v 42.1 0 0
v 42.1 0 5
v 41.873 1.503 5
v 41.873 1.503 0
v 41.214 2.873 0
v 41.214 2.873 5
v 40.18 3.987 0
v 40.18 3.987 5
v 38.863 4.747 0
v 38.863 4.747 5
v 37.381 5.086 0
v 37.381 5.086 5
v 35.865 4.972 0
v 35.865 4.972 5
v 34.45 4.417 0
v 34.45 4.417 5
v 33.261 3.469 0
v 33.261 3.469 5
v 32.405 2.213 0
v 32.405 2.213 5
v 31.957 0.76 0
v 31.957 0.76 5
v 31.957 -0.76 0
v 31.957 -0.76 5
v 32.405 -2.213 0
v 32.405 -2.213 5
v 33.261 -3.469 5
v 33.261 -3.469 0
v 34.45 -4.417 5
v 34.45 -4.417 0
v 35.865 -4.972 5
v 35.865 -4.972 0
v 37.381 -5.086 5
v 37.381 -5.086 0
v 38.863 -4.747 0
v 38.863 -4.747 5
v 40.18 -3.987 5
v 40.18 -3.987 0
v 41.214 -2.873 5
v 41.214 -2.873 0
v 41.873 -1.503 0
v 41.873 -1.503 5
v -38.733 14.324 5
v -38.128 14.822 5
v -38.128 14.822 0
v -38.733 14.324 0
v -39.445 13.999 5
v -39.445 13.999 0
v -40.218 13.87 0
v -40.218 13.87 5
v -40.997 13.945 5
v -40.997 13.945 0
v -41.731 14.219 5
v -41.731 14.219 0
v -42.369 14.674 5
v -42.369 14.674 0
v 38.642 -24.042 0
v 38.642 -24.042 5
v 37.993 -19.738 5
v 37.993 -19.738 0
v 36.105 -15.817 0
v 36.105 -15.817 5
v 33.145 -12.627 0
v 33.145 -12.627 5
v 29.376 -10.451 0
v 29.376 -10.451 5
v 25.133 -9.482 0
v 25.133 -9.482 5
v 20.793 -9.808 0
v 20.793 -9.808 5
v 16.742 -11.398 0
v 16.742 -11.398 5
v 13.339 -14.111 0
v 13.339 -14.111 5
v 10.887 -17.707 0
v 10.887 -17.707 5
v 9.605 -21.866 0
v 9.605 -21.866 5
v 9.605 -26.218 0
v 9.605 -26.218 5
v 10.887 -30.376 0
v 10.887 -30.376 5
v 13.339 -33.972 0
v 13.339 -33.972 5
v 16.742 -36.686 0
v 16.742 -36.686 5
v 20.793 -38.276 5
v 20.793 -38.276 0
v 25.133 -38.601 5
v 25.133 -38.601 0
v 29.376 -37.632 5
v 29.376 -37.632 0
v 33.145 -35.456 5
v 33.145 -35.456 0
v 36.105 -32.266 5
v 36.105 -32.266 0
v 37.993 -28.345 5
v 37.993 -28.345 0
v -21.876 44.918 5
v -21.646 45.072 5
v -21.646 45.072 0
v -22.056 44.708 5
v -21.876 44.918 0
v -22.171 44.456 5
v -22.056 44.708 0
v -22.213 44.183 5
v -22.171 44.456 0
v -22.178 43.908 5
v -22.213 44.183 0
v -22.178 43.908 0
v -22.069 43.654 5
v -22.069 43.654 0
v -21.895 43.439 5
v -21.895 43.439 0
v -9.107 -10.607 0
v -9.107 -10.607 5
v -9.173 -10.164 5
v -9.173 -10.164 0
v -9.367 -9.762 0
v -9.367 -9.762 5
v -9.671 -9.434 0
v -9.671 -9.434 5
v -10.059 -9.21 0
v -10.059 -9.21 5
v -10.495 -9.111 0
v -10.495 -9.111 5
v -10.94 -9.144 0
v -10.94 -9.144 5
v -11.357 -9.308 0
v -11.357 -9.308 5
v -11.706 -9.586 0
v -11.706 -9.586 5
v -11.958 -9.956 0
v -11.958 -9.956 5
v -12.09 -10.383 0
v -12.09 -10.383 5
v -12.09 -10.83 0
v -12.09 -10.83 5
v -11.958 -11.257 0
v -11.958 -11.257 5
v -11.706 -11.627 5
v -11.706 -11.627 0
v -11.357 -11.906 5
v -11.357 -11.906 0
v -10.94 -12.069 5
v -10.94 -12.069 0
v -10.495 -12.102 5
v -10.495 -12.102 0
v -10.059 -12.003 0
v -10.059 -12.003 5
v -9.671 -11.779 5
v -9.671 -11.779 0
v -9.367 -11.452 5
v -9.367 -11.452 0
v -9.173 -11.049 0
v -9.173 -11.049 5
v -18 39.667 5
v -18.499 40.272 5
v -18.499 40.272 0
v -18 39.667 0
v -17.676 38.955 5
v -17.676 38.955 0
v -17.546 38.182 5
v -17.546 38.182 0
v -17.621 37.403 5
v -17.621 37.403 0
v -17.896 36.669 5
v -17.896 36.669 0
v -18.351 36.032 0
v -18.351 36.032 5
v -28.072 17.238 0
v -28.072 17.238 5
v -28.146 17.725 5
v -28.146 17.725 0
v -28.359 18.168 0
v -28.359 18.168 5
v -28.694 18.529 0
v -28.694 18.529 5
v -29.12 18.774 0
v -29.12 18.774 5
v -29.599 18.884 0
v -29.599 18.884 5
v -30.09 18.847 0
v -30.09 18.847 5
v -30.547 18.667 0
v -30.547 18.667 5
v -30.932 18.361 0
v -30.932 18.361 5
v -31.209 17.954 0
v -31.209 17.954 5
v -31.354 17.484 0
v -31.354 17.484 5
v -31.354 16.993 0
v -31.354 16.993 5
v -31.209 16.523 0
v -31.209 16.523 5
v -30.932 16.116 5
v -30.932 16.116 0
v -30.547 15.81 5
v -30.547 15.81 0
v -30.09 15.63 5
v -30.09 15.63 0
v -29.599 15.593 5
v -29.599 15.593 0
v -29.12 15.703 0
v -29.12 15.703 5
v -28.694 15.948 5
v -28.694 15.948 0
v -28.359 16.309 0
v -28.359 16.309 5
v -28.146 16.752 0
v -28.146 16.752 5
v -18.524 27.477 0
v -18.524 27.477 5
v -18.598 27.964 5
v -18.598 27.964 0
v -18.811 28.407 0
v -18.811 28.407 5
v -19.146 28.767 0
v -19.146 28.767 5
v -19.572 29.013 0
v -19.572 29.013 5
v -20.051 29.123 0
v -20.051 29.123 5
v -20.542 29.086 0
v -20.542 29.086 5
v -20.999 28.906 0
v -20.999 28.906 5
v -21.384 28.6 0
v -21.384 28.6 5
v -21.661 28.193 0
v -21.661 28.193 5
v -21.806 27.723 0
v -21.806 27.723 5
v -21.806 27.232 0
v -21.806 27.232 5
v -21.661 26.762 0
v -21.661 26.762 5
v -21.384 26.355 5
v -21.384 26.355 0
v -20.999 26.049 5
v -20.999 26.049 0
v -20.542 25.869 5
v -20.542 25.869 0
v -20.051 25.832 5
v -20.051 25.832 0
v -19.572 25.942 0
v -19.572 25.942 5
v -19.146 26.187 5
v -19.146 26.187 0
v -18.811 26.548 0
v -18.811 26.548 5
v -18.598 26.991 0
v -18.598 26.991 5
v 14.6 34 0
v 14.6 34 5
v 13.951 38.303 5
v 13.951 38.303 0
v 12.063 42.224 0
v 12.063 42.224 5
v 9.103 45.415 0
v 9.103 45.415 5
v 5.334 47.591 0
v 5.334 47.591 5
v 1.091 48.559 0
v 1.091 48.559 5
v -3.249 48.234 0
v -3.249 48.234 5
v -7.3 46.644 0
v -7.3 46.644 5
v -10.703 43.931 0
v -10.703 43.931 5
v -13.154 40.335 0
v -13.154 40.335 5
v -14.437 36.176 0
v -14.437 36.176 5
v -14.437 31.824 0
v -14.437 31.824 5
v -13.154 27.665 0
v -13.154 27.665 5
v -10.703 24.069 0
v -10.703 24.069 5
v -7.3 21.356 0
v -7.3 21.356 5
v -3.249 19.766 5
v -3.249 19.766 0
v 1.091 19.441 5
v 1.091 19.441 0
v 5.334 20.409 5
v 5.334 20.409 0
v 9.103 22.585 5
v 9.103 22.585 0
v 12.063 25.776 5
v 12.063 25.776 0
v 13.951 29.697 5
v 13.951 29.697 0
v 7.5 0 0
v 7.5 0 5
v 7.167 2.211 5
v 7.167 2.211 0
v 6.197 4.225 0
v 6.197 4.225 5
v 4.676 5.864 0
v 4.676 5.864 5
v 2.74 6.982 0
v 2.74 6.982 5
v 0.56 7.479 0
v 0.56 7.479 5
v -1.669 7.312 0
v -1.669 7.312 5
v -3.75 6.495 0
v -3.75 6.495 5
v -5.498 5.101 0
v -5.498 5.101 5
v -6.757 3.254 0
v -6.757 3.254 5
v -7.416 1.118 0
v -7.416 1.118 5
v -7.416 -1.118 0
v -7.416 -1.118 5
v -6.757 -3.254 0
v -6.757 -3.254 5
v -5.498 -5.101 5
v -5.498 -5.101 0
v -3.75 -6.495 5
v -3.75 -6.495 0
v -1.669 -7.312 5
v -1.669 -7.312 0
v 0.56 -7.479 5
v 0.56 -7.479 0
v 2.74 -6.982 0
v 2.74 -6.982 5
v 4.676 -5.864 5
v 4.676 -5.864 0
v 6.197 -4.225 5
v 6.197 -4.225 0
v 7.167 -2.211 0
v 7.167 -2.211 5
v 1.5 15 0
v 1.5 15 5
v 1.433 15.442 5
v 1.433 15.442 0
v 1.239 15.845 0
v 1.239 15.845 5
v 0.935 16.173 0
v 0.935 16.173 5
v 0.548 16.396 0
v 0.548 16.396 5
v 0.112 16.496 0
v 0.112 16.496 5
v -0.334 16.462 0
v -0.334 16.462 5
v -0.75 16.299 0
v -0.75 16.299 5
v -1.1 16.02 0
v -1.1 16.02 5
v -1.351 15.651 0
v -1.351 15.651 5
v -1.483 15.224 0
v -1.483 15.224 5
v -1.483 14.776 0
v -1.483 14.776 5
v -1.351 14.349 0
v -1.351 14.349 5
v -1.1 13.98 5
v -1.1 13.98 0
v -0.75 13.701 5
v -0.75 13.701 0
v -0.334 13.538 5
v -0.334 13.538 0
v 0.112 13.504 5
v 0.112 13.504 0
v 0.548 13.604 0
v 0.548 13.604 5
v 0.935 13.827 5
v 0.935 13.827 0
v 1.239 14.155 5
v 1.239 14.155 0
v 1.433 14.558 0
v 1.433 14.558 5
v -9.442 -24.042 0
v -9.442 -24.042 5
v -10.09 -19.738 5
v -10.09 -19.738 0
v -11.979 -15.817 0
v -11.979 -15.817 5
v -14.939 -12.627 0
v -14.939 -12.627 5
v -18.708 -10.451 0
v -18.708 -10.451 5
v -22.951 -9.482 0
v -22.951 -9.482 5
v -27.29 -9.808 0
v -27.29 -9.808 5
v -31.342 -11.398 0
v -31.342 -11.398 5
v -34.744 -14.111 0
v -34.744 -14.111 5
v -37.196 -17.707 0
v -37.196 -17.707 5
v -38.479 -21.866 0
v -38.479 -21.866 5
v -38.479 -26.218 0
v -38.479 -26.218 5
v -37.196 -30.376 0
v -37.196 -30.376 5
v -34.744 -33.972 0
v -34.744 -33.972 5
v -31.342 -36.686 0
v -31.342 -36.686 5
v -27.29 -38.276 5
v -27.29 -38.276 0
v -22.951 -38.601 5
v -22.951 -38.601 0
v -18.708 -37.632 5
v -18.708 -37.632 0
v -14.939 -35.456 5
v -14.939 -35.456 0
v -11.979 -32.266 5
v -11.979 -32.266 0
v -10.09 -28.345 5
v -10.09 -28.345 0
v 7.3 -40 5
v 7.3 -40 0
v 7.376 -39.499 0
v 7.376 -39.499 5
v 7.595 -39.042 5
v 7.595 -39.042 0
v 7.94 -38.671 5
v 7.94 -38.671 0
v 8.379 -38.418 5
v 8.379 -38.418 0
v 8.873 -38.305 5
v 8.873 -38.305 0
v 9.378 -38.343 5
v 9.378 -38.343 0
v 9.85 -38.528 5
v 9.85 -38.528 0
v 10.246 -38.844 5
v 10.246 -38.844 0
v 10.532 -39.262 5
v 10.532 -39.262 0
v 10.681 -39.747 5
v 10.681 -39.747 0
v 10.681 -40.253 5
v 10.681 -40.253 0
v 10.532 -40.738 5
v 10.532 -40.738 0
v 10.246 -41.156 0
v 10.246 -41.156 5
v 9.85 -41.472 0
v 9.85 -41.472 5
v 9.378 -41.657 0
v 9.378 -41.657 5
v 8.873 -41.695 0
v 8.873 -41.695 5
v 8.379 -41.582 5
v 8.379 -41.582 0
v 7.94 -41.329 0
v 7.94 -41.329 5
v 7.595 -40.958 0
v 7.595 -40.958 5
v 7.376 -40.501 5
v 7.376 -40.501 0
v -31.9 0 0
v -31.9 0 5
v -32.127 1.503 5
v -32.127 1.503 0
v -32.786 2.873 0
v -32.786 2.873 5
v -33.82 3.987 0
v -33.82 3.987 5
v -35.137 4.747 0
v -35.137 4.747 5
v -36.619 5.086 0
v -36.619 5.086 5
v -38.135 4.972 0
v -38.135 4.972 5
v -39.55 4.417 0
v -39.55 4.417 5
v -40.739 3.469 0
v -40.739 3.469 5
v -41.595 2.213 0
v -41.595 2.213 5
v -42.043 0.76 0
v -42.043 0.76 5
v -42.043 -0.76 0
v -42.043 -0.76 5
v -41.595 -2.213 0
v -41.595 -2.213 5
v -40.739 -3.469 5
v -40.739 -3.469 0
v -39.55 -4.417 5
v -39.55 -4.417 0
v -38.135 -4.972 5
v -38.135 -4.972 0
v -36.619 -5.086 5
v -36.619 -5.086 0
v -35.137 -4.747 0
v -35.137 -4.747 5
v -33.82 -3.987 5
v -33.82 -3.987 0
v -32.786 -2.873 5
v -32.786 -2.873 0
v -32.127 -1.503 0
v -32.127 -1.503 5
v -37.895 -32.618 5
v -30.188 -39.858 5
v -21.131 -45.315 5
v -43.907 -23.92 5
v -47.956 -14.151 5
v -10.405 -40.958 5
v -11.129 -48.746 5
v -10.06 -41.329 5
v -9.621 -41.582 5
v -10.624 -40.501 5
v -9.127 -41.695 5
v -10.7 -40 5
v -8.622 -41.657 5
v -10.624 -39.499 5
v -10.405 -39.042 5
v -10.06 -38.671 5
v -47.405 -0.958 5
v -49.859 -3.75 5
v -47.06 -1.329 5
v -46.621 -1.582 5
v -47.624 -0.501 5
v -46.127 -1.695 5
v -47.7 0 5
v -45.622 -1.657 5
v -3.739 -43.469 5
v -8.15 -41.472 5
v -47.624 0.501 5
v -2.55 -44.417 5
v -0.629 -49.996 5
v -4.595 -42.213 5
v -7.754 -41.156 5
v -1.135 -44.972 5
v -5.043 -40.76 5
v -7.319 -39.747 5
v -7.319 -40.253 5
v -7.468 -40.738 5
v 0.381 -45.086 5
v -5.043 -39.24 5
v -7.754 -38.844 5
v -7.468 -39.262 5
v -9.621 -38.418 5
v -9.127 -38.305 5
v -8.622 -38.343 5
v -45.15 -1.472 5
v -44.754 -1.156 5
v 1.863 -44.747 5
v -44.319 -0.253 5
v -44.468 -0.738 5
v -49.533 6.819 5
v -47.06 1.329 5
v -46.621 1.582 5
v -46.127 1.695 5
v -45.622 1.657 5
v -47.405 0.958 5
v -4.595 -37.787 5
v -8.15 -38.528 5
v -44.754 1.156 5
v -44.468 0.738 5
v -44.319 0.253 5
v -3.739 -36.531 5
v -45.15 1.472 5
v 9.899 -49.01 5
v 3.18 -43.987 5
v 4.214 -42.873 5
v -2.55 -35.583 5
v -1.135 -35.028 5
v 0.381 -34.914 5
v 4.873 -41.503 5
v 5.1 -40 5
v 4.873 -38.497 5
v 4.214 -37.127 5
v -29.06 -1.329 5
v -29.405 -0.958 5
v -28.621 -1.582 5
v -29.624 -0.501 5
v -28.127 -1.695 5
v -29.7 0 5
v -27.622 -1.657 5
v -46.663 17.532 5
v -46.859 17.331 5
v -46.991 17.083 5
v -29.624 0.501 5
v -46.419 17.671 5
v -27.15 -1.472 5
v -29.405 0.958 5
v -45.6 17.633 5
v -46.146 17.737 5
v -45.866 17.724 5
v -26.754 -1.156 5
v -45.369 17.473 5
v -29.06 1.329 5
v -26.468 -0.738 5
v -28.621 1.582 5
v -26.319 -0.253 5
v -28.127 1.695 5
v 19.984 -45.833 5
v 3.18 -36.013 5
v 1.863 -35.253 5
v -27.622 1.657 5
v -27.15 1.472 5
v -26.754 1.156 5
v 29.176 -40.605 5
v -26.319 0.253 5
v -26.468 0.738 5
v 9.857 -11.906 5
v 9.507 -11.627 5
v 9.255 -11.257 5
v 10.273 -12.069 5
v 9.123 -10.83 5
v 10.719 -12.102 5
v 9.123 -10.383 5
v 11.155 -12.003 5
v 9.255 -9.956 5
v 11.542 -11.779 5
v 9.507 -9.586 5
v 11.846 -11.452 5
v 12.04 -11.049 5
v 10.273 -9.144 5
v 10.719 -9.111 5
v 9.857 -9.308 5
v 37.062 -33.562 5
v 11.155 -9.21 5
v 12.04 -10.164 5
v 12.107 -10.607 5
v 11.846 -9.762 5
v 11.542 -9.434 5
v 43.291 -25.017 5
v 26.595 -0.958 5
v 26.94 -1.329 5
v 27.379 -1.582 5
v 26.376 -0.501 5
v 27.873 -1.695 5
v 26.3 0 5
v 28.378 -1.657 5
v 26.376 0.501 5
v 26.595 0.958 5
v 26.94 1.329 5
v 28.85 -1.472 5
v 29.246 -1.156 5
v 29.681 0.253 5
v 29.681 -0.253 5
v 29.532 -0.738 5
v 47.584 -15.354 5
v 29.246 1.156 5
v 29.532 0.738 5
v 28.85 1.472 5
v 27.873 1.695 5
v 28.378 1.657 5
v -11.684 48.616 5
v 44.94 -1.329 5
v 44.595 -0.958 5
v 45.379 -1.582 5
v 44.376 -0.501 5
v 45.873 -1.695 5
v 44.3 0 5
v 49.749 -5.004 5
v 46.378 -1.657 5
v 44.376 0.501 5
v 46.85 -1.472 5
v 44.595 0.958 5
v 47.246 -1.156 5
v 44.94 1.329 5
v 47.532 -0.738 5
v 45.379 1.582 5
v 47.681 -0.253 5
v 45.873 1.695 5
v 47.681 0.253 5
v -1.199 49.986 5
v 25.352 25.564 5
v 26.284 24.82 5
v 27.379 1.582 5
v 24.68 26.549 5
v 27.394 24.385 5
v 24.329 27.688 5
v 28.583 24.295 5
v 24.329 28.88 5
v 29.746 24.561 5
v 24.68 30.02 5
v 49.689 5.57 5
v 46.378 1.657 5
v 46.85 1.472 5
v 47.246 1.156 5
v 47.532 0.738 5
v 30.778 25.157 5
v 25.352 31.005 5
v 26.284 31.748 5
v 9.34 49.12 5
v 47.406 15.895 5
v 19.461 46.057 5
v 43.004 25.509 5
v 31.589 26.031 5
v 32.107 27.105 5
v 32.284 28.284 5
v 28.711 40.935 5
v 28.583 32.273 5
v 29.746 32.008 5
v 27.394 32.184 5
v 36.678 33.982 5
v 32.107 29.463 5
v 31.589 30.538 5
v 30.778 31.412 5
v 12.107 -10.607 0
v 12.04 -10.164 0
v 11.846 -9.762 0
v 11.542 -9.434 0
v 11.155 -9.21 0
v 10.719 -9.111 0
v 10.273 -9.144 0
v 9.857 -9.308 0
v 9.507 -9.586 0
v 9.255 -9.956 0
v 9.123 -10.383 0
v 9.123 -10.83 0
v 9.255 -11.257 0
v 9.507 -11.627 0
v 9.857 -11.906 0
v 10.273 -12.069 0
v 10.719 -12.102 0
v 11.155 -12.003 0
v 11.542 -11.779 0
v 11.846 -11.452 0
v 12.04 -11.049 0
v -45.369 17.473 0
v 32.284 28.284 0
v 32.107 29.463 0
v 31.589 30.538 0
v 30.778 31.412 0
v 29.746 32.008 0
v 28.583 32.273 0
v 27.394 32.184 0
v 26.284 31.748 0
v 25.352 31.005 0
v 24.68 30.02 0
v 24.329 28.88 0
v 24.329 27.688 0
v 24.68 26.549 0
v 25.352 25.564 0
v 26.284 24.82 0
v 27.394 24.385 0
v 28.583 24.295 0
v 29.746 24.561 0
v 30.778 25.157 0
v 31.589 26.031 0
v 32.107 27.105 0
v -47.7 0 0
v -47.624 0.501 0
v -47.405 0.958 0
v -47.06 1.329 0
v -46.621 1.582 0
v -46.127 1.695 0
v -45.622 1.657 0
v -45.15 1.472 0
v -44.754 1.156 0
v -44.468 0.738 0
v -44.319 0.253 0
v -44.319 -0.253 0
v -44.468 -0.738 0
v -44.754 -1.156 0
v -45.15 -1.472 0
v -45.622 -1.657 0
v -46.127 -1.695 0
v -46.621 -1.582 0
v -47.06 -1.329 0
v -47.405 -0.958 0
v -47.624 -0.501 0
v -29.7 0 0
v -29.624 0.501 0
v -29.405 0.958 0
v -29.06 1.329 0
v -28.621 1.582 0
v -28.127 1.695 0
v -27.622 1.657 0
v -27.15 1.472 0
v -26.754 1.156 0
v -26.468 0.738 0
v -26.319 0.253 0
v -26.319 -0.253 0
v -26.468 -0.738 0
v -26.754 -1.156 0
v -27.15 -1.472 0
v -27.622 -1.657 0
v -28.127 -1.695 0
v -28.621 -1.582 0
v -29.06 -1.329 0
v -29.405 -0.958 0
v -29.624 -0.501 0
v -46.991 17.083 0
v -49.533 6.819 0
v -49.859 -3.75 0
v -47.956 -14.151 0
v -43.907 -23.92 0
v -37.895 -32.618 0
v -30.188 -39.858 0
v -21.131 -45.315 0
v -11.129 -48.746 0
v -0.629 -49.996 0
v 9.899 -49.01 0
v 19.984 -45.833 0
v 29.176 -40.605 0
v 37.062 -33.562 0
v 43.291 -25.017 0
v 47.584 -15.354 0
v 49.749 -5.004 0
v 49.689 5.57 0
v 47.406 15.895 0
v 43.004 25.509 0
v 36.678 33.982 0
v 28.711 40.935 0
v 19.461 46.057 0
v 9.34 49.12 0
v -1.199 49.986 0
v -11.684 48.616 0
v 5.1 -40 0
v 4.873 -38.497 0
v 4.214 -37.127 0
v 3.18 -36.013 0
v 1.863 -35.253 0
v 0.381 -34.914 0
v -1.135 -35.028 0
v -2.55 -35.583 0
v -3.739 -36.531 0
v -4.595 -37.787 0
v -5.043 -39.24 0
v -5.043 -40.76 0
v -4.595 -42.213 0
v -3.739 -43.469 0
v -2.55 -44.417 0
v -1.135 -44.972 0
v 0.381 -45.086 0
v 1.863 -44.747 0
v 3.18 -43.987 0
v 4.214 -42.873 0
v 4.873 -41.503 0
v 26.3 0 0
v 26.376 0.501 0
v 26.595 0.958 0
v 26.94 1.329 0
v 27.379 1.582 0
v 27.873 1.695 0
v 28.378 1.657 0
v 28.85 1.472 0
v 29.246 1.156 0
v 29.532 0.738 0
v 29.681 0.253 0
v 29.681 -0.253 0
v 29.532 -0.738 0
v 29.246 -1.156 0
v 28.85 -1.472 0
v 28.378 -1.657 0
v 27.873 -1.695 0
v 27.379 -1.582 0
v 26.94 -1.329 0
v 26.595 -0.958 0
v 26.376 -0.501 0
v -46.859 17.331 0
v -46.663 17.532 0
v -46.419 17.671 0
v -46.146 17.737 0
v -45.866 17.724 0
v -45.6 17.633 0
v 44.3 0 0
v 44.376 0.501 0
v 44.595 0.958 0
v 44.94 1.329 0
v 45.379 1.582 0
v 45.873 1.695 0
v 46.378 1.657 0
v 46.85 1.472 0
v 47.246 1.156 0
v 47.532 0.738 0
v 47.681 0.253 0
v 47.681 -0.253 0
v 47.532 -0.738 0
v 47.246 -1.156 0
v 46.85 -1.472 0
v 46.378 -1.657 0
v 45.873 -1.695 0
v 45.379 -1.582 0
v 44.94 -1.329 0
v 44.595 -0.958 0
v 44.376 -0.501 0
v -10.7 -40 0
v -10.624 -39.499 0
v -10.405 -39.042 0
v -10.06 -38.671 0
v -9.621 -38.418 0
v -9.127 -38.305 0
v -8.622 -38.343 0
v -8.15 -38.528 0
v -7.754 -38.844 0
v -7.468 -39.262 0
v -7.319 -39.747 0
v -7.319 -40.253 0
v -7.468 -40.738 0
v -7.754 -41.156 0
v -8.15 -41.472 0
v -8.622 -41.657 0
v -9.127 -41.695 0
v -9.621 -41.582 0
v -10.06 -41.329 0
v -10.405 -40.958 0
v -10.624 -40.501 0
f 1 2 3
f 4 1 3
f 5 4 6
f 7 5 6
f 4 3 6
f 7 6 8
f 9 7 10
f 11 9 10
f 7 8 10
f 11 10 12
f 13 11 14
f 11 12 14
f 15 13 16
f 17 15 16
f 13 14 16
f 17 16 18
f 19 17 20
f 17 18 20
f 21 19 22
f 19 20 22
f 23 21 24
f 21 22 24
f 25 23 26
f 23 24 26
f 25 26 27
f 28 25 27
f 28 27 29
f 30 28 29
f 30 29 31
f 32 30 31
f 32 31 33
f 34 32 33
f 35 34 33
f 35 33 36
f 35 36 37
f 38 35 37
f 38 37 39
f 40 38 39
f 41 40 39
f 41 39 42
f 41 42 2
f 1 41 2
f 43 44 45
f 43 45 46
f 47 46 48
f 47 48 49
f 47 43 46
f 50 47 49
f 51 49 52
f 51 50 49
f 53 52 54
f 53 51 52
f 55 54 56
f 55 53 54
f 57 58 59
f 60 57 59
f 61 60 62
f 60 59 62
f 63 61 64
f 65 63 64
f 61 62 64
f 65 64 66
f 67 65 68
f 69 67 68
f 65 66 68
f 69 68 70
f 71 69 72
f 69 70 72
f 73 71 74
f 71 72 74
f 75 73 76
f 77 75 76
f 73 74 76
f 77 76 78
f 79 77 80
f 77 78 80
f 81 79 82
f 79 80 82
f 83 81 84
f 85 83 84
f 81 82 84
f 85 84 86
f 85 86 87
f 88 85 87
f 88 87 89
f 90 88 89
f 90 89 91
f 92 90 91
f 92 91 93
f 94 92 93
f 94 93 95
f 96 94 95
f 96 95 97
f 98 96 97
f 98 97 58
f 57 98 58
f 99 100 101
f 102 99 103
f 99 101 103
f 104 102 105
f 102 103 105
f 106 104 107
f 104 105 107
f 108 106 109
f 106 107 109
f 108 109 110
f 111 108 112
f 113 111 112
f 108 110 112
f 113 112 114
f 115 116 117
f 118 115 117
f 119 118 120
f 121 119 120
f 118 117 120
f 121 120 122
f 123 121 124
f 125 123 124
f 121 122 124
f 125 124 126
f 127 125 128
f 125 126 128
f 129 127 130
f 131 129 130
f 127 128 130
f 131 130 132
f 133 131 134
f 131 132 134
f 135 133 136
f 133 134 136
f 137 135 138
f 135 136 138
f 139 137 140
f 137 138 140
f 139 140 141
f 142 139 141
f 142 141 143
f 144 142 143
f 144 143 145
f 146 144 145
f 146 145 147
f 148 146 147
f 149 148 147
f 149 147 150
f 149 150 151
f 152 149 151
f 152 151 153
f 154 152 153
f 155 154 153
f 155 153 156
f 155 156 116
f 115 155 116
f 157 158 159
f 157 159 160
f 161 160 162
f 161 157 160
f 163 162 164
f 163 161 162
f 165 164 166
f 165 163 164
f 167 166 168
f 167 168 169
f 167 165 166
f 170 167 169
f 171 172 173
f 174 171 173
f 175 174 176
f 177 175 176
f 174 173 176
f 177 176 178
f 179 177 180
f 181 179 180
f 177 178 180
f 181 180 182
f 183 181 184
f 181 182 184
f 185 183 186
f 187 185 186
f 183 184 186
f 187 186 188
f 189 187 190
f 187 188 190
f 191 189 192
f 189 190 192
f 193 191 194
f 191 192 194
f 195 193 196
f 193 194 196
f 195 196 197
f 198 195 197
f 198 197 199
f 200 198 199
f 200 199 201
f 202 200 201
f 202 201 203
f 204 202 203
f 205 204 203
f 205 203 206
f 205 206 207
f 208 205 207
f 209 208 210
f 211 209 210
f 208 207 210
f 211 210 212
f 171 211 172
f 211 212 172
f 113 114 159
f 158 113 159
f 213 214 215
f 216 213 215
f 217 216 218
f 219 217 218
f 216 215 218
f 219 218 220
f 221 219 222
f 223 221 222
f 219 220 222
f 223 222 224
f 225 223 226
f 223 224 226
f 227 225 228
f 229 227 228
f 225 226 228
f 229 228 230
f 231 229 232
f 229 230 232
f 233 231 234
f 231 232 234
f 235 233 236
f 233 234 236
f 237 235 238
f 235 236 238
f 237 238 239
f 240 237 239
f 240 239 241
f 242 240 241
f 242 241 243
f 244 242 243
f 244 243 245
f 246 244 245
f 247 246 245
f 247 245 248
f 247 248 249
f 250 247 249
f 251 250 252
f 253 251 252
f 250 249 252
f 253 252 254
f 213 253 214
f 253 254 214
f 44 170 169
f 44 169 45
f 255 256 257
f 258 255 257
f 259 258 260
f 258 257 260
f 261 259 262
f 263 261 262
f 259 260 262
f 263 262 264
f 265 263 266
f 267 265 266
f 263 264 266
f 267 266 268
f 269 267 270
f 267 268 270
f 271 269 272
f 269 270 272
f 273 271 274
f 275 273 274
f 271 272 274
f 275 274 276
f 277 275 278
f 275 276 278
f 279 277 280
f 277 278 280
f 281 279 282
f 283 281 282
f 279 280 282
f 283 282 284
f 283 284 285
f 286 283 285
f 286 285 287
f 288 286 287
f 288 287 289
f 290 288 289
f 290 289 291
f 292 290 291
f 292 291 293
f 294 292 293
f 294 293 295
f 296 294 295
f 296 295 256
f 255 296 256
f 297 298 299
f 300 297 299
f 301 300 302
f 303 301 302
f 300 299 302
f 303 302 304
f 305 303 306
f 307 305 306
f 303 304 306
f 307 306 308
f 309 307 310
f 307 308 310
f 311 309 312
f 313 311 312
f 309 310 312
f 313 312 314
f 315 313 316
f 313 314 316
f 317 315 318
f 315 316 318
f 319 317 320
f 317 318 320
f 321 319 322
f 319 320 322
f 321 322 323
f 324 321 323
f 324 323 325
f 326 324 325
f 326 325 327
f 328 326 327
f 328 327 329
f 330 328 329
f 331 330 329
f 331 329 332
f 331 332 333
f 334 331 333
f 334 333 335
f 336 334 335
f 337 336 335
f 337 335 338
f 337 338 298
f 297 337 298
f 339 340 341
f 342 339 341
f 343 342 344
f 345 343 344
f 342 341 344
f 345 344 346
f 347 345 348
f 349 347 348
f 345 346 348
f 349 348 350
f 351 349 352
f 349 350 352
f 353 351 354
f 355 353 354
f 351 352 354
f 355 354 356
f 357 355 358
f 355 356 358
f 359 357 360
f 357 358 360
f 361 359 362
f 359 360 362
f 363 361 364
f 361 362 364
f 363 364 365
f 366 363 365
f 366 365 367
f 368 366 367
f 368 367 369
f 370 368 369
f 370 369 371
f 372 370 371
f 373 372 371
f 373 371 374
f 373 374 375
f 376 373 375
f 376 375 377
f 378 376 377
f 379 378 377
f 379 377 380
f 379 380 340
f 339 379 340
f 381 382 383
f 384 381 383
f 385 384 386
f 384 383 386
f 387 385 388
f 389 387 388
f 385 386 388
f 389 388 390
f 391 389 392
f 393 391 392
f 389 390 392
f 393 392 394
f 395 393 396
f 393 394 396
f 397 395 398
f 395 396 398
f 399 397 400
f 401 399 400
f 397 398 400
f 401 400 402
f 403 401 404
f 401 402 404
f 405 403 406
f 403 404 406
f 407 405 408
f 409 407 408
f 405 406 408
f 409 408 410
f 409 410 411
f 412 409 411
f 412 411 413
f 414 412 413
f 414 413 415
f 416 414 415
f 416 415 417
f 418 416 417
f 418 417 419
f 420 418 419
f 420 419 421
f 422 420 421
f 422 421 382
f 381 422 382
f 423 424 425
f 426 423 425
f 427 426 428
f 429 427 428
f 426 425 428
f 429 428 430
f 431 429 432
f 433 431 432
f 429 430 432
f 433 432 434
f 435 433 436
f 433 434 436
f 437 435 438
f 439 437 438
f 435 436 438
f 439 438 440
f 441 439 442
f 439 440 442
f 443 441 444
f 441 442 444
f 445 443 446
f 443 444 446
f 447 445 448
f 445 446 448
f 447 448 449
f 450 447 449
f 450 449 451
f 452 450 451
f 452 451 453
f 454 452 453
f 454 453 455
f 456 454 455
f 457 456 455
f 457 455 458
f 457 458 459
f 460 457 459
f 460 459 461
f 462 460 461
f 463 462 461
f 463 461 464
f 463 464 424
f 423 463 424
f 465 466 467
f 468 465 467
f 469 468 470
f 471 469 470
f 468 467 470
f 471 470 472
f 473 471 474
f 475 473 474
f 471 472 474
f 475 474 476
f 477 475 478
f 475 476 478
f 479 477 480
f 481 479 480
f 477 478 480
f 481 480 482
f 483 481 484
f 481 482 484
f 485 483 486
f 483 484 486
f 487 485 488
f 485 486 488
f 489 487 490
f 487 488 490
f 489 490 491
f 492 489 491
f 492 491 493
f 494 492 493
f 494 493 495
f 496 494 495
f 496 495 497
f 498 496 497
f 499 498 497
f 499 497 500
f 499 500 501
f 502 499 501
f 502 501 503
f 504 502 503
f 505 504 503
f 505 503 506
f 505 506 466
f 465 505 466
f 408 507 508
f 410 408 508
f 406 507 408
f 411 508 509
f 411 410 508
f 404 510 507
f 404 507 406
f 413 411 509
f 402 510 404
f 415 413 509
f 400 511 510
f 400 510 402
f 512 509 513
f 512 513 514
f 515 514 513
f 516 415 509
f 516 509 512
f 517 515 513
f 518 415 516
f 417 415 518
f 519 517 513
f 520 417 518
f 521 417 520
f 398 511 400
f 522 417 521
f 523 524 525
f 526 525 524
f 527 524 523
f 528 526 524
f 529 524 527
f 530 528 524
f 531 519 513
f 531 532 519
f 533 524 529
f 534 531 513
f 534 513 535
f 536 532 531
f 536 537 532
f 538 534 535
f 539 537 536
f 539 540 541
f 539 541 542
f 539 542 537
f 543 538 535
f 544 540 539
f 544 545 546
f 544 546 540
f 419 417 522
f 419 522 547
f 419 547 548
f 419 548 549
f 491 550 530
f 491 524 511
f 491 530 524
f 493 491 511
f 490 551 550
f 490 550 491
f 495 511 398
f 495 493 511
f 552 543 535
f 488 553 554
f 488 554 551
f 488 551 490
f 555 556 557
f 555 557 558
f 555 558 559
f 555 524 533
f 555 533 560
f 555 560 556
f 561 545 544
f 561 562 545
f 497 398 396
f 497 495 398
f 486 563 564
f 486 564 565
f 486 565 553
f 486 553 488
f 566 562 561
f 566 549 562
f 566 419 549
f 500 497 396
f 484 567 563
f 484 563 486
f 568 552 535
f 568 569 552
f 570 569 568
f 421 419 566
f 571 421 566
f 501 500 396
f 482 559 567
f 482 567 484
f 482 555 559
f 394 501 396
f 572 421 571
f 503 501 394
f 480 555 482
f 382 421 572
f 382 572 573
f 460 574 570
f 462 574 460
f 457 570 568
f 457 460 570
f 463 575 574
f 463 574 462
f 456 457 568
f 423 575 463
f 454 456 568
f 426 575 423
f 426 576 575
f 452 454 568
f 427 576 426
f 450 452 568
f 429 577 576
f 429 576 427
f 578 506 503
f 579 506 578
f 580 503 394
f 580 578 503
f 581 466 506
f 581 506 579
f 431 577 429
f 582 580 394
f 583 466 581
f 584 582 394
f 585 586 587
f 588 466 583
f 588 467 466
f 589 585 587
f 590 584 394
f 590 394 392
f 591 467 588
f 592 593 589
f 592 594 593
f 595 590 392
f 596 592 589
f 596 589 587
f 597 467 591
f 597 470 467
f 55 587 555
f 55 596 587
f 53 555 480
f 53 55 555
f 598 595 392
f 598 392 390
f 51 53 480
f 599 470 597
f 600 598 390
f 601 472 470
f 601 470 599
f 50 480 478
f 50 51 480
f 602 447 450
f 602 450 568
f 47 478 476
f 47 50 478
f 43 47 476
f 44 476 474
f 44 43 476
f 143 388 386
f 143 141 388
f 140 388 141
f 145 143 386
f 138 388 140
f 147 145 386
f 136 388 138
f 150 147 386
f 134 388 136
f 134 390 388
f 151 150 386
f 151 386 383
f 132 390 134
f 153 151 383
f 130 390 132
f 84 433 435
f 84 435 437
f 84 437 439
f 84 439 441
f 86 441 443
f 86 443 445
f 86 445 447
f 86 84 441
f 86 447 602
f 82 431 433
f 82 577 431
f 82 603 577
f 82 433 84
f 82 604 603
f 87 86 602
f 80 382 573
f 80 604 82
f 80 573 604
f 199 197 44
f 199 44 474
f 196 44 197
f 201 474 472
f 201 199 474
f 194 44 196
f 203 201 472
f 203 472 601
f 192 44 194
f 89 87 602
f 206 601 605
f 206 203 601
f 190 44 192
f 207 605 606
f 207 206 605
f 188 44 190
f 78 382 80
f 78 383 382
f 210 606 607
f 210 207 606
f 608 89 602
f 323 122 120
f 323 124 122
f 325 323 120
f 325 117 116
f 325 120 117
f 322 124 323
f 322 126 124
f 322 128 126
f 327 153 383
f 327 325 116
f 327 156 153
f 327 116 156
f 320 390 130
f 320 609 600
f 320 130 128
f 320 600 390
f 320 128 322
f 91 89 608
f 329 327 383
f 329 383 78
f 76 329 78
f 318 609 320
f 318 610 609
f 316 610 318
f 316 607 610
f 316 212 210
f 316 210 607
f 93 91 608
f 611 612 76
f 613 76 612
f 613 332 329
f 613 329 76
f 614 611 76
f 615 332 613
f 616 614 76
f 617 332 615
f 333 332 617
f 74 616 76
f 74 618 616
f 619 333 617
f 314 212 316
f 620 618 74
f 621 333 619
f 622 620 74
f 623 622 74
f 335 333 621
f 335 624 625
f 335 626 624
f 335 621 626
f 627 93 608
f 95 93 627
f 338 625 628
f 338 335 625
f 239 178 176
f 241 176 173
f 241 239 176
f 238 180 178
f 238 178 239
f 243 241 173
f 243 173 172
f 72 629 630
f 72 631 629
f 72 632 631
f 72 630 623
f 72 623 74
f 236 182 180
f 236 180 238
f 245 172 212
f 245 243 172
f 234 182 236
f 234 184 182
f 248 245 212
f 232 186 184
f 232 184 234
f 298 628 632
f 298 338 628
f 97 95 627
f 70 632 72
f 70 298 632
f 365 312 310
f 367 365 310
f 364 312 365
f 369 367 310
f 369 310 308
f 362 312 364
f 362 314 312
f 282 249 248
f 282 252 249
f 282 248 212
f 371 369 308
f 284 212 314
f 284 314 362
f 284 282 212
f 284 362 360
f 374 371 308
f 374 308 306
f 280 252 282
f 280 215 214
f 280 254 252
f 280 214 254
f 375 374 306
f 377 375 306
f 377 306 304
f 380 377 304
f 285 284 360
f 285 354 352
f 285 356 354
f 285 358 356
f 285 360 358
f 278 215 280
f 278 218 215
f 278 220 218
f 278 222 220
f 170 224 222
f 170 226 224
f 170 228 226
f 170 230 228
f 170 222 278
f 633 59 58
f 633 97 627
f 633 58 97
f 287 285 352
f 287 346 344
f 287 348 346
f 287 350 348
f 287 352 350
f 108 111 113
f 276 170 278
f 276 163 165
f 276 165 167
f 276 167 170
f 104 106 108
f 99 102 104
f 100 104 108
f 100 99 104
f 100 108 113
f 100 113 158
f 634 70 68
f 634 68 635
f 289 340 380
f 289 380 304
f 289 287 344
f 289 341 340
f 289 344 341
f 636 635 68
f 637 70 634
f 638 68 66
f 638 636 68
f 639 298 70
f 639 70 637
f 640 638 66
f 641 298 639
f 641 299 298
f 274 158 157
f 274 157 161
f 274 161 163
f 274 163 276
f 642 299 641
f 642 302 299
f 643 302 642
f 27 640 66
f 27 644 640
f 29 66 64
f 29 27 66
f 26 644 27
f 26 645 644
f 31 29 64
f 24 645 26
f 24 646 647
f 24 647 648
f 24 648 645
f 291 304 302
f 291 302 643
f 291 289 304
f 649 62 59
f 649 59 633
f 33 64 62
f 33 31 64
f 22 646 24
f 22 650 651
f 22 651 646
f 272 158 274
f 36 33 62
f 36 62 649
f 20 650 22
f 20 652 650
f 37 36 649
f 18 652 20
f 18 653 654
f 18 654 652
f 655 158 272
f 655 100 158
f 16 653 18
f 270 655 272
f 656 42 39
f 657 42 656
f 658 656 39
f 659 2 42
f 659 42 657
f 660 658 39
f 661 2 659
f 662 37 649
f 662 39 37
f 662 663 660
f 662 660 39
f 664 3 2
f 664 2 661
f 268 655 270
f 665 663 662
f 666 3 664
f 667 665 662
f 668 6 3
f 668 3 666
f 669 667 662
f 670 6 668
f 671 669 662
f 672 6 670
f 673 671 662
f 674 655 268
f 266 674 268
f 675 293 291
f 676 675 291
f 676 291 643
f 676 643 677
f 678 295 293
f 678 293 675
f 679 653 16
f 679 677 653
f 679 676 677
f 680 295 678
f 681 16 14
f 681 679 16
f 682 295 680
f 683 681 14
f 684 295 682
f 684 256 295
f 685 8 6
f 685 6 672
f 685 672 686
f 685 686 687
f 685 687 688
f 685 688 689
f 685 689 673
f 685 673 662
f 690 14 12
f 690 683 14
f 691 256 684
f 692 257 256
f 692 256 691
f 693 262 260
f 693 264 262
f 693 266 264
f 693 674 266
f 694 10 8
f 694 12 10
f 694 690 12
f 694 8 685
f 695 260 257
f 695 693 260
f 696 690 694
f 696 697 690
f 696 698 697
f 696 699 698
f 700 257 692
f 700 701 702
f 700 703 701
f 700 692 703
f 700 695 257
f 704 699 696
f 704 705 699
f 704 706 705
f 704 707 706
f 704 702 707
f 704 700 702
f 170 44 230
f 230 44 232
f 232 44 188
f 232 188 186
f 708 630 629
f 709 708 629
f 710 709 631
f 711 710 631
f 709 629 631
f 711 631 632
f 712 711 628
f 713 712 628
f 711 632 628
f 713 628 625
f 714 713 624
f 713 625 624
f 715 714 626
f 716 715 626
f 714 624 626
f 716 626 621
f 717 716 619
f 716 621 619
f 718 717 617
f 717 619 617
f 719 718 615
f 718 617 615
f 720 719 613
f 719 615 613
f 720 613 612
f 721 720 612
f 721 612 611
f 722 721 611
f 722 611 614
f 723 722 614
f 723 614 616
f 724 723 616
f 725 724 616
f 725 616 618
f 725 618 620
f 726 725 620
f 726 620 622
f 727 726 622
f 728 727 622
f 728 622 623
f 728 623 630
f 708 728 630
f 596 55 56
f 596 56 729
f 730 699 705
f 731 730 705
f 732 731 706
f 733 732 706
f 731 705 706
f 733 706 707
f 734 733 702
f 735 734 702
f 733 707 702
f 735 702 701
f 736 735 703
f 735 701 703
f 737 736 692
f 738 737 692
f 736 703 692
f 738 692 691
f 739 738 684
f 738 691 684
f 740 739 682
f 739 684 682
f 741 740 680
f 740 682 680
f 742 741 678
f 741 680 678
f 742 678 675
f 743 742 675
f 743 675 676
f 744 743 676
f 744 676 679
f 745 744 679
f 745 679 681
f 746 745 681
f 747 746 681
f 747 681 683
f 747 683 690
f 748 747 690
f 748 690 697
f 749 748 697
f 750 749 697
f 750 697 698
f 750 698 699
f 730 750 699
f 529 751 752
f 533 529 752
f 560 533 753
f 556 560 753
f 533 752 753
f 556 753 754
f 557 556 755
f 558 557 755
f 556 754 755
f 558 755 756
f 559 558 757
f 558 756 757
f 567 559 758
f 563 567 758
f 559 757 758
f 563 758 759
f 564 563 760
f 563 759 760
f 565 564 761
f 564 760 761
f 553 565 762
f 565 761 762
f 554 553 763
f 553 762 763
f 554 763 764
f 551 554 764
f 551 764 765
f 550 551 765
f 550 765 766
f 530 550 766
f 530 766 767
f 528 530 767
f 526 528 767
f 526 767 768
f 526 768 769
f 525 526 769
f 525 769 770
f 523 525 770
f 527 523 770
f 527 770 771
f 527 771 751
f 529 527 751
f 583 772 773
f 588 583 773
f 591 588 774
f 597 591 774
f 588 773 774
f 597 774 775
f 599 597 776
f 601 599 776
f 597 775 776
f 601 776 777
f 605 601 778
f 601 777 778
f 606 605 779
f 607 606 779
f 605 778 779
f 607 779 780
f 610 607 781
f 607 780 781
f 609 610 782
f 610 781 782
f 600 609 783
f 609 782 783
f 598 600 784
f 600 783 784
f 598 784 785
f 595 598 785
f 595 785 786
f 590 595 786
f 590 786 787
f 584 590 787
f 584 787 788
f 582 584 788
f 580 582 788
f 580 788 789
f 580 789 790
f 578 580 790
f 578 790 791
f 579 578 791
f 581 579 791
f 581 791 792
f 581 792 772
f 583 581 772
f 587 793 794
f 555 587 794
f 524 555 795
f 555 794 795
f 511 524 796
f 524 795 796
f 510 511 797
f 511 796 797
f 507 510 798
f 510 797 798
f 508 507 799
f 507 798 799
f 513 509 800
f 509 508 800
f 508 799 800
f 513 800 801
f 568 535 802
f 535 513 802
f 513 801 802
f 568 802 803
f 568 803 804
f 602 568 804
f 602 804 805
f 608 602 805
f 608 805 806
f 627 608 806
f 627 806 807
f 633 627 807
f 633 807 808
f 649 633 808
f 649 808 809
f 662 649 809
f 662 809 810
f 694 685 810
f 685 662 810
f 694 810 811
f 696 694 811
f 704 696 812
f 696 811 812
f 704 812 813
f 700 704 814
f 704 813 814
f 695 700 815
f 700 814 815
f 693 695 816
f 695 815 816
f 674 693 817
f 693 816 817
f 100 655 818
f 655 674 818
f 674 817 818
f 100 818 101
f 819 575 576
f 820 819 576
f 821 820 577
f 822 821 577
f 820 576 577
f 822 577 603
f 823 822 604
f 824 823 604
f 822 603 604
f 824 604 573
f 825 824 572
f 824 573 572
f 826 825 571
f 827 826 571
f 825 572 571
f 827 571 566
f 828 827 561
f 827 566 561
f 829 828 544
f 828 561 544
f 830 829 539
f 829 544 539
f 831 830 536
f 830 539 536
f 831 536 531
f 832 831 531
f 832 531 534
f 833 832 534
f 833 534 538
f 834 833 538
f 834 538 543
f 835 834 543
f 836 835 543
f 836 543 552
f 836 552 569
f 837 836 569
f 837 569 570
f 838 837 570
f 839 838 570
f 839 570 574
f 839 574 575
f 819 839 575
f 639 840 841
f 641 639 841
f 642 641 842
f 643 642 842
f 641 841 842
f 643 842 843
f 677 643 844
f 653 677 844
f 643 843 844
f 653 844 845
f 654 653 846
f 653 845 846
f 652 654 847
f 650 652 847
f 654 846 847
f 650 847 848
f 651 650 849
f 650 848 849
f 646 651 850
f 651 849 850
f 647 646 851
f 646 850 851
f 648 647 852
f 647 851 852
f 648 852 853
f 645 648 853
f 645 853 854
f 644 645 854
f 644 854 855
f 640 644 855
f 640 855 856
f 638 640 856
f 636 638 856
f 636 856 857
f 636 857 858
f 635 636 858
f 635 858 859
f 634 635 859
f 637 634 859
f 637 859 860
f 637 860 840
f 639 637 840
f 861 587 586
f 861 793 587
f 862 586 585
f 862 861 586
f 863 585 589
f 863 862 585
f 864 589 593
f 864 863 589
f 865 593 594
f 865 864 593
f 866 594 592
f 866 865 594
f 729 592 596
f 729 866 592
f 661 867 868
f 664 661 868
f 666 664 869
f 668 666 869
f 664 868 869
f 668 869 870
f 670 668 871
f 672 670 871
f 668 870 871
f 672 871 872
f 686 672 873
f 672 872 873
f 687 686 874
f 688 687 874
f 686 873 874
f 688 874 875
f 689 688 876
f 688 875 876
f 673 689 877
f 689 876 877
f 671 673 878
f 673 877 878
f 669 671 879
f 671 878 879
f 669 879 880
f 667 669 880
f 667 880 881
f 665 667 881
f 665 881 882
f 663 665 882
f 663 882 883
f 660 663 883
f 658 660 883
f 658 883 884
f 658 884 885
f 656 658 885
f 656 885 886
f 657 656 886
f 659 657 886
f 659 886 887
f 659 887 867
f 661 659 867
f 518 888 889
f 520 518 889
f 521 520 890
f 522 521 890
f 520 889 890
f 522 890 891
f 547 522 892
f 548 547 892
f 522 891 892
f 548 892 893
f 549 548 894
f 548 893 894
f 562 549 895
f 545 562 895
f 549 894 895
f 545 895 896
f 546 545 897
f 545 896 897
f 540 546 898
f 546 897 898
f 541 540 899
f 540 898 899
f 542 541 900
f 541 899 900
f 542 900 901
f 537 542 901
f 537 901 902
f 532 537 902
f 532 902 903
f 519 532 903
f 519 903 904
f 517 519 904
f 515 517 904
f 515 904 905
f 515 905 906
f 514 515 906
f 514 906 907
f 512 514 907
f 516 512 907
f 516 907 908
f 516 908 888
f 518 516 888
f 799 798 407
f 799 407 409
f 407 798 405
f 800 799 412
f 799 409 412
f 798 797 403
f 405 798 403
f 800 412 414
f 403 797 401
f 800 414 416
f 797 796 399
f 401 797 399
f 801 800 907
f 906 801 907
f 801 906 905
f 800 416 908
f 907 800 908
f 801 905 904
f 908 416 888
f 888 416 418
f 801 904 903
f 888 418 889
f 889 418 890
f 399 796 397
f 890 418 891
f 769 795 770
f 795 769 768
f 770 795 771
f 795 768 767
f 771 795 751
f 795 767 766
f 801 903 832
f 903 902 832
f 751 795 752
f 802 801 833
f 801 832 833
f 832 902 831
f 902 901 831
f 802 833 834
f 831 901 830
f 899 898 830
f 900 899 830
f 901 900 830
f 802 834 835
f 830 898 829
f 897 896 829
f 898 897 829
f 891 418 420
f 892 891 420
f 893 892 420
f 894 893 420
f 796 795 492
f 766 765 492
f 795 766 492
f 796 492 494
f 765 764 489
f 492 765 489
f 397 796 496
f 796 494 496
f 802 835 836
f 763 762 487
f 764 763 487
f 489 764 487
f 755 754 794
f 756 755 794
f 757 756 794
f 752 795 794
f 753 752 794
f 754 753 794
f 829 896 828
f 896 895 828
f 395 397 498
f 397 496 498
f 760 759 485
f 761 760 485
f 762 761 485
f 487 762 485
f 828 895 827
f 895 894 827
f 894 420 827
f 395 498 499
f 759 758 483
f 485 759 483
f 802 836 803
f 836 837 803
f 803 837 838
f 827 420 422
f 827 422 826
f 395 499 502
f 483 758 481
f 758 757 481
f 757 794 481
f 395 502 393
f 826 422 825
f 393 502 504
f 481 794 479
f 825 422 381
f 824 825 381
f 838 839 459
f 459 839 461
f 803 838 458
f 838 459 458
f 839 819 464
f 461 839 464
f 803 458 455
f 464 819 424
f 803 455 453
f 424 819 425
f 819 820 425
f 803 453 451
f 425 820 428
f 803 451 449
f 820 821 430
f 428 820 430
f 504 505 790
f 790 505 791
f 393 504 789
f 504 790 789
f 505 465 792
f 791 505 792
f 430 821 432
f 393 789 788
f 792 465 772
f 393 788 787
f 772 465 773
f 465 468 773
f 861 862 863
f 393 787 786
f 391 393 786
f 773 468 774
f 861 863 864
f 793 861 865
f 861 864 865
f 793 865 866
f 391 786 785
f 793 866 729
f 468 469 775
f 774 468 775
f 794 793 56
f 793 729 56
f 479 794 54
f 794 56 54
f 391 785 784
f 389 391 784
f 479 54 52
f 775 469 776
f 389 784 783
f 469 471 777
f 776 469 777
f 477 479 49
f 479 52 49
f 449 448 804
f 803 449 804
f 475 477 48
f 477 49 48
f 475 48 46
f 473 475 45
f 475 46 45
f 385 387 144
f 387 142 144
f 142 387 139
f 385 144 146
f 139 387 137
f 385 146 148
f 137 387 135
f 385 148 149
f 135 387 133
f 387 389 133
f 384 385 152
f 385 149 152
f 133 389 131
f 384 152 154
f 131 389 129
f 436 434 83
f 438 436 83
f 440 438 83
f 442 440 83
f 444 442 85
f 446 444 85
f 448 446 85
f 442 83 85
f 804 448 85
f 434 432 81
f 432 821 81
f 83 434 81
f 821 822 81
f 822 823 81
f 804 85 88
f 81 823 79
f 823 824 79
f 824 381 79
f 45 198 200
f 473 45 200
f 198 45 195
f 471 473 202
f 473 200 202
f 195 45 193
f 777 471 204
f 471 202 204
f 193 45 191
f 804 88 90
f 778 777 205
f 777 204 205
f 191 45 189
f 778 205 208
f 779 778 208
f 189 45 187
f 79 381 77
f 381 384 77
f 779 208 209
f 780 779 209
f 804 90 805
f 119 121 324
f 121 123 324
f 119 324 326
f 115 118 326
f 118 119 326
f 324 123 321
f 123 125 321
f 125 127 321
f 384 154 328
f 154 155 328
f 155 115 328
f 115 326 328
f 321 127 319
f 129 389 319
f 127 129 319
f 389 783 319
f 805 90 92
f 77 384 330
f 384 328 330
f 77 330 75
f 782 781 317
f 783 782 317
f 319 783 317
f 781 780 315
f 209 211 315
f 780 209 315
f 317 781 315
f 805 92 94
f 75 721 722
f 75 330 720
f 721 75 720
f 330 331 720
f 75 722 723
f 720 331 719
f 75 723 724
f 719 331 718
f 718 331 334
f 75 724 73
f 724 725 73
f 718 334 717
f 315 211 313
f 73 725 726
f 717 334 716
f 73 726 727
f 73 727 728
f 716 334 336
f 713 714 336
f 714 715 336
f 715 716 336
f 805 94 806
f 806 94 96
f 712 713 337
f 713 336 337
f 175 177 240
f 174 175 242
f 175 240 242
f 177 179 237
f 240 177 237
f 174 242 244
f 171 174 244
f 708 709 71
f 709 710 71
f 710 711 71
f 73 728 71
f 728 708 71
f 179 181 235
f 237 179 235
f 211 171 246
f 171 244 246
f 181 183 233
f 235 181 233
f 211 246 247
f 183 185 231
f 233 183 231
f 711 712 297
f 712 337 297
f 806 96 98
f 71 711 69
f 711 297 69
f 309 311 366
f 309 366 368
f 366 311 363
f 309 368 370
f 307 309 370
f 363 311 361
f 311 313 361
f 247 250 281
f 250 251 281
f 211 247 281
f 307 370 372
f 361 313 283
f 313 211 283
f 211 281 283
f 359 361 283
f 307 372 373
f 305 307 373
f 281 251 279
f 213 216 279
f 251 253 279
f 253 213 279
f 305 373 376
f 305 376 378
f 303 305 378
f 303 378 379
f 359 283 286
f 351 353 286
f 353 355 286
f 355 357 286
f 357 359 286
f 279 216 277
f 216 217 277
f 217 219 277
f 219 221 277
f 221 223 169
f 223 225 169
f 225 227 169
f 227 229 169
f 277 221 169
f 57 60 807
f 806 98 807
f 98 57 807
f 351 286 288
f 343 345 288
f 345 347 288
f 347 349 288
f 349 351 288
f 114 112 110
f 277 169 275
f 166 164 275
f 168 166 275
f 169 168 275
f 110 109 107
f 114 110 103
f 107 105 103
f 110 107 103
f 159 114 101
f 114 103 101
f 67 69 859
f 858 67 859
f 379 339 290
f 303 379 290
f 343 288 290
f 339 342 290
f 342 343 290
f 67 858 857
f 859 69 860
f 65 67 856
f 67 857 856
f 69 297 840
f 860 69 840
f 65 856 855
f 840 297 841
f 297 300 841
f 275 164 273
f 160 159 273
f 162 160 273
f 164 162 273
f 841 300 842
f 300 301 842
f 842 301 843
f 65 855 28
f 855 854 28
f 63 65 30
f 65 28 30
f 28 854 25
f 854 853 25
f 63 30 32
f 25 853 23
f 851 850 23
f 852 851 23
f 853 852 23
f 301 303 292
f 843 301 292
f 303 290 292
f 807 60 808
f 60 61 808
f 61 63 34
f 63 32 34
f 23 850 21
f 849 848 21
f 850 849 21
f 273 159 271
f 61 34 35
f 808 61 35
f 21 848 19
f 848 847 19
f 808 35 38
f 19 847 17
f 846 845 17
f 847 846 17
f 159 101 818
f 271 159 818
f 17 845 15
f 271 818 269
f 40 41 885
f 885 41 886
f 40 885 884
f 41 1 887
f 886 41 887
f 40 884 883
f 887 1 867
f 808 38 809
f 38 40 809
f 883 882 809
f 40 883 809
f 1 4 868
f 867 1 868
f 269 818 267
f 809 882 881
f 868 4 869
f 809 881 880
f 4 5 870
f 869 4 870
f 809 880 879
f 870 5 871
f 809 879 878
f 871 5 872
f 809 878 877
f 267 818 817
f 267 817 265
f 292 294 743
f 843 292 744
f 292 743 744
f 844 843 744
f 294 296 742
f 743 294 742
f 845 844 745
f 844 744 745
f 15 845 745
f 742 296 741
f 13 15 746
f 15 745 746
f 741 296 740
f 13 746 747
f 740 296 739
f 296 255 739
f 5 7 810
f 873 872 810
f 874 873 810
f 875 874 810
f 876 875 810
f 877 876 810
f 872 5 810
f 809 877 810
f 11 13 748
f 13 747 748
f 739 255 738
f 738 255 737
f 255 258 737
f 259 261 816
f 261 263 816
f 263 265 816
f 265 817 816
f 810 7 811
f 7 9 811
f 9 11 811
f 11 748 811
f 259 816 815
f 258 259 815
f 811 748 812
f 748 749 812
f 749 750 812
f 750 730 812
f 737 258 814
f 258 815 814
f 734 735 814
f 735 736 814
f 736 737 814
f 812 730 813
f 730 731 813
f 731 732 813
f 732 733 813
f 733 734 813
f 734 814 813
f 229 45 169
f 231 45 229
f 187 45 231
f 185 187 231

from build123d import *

# Parameters (mm, degrees)
SKETCH1_R                    = 50
BOSS_EXTRUDE1_DEPTH          = 5
F_15_0_15_DIAMETER_HOLE1_D   = 15
F_10_2_10_2_DIAMETER_HOLE1_D = 10.2
M3_CLEARANCE_HOLE1_D         = 3.4
SKETCH9_R                    = 14.6
SKETCH9_R_2                  = 1.5
CUT_EXTRUDE1_DEPTH           = 10
SKETCH10_R                   = 1.65
CUT_EXTRUDE2_DEPTH           = 5
SKETCH11_R                   = 4
CUT_EXTRUDE3_DEPTH           = 10
FILLET1_R                    = 1


with BuildPart() as part:
    # Sketch1 → Boss-Extrude1 (new body)
    with BuildSketch(Plane.XY):
        Circle(SKETCH1_R)
    extrude(amount=BOSS_EXTRUDE1_DEPTH)

    # Ø15.0 (15) Diameter Hole1 (through all)
    with Locations(Plane(origin=(0, 0, 0), x_dir=(-1, 0, 0), z_dir=(0, 0, -1))):
        with Locations((0, 0)):
            Hole(F_15_0_15_DIAMETER_HOLE1_D / 2)

    # Ø10.2 (10.2) Diameter Hole1 (through all)
    with Locations(Plane(origin=(0, 0, 0), x_dir=(-1, 0, 0), z_dir=(0, 0, -1))):
        with Locations((37, 0), (-37, 0), (0, -40)):
            Hole(F_10_2_10_2_DIAMETER_HOLE1_D / 2)

    # M3 Clearance Hole1 (through all)
    with Locations(Plane.XY.offset(5)):
        with Locations((46, 0), (28, 0), (9, -40), (-9, -40), (-46, 0), (-28, 0)):
            Hole(M3_CLEARANCE_HOLE1_D / 2)

    # Sketch9 → Cut-Extrude1 (cut)
    with BuildSketch(Plane.XY.offset(5)):
        with Locations((24.04163056, -24.04163056)):
            Circle(SKETCH9_R)
        with Locations((10.606601718, -10.606601718)):
            Circle(SKETCH9_R_2)
        with Locations((-24.04163056, -24.04163056)):
            Circle(SKETCH9_R)
        with Locations((-10.606601718, -10.606601718)):
            Circle(SKETCH9_R_2)
        with Locations((0, 34)):
            Circle(SKETCH9_R)
        with Locations((0, 15)):
            Circle(SKETCH9_R_2)
    extrude(amount=-CUT_EXTRUDE1_DEPTH, mode=Mode.SUBTRACT)

    # Sketch10 → Cut-Extrude2 (cut)
    with BuildSketch(Plane.XY.offset(5)):
        with Locations((-20.17442319, 27.477446333)):
            Circle(SKETCH10_R)
        with Locations((-29.722400231, 17.23849451)):
            Circle(SKETCH10_R)
        with BuildLine():
            Line((-27.274837591, 48.455628221), (-18.498593172, 40.2716479))
            ThreePointArc((-18.498593172, 40.2716479), (-17.546415771, 38.182285285), (-18.350527147, 36.031591715))
            Line((-18.350527147, 36.031591715), (-38.128479589, 14.822334368))
            ThreePointArc((-38.128479589, 14.822334368), (-40.217842204, 13.870156967), (-42.368535774, 14.674268343))
            Line((-42.368535774, 14.674268343), (-51.144780194, 22.858248664))
            Line((-51.144780194, 22.858248664), (-27.274837591, 48.455628221))
        make_face()
    extrude(amount=-CUT_EXTRUDE2_DEPTH, mode=Mode.SUBTRACT)

    # Sketch11 → Cut-Extrude3 (cut)
    with BuildSketch(Plane.XY.offset(5)):
        with Locations((28.284271247, 28.284271247)):
            Circle(SKETCH11_R)
    extrude(amount=-CUT_EXTRUDE3_DEPTH, mode=Mode.SUBTRACT)

    # Fillet1
    fillet1_edges = [part.edges().sort_by_distance(p)[0] for p in [
        (-46.456878561, 18.486709669, 2.5),
        (-22.949421323, 44.422112297, 2.5),
    ]]
    fillet(fillet1_edges, radius=FILLET1_R)


solid = part.part
